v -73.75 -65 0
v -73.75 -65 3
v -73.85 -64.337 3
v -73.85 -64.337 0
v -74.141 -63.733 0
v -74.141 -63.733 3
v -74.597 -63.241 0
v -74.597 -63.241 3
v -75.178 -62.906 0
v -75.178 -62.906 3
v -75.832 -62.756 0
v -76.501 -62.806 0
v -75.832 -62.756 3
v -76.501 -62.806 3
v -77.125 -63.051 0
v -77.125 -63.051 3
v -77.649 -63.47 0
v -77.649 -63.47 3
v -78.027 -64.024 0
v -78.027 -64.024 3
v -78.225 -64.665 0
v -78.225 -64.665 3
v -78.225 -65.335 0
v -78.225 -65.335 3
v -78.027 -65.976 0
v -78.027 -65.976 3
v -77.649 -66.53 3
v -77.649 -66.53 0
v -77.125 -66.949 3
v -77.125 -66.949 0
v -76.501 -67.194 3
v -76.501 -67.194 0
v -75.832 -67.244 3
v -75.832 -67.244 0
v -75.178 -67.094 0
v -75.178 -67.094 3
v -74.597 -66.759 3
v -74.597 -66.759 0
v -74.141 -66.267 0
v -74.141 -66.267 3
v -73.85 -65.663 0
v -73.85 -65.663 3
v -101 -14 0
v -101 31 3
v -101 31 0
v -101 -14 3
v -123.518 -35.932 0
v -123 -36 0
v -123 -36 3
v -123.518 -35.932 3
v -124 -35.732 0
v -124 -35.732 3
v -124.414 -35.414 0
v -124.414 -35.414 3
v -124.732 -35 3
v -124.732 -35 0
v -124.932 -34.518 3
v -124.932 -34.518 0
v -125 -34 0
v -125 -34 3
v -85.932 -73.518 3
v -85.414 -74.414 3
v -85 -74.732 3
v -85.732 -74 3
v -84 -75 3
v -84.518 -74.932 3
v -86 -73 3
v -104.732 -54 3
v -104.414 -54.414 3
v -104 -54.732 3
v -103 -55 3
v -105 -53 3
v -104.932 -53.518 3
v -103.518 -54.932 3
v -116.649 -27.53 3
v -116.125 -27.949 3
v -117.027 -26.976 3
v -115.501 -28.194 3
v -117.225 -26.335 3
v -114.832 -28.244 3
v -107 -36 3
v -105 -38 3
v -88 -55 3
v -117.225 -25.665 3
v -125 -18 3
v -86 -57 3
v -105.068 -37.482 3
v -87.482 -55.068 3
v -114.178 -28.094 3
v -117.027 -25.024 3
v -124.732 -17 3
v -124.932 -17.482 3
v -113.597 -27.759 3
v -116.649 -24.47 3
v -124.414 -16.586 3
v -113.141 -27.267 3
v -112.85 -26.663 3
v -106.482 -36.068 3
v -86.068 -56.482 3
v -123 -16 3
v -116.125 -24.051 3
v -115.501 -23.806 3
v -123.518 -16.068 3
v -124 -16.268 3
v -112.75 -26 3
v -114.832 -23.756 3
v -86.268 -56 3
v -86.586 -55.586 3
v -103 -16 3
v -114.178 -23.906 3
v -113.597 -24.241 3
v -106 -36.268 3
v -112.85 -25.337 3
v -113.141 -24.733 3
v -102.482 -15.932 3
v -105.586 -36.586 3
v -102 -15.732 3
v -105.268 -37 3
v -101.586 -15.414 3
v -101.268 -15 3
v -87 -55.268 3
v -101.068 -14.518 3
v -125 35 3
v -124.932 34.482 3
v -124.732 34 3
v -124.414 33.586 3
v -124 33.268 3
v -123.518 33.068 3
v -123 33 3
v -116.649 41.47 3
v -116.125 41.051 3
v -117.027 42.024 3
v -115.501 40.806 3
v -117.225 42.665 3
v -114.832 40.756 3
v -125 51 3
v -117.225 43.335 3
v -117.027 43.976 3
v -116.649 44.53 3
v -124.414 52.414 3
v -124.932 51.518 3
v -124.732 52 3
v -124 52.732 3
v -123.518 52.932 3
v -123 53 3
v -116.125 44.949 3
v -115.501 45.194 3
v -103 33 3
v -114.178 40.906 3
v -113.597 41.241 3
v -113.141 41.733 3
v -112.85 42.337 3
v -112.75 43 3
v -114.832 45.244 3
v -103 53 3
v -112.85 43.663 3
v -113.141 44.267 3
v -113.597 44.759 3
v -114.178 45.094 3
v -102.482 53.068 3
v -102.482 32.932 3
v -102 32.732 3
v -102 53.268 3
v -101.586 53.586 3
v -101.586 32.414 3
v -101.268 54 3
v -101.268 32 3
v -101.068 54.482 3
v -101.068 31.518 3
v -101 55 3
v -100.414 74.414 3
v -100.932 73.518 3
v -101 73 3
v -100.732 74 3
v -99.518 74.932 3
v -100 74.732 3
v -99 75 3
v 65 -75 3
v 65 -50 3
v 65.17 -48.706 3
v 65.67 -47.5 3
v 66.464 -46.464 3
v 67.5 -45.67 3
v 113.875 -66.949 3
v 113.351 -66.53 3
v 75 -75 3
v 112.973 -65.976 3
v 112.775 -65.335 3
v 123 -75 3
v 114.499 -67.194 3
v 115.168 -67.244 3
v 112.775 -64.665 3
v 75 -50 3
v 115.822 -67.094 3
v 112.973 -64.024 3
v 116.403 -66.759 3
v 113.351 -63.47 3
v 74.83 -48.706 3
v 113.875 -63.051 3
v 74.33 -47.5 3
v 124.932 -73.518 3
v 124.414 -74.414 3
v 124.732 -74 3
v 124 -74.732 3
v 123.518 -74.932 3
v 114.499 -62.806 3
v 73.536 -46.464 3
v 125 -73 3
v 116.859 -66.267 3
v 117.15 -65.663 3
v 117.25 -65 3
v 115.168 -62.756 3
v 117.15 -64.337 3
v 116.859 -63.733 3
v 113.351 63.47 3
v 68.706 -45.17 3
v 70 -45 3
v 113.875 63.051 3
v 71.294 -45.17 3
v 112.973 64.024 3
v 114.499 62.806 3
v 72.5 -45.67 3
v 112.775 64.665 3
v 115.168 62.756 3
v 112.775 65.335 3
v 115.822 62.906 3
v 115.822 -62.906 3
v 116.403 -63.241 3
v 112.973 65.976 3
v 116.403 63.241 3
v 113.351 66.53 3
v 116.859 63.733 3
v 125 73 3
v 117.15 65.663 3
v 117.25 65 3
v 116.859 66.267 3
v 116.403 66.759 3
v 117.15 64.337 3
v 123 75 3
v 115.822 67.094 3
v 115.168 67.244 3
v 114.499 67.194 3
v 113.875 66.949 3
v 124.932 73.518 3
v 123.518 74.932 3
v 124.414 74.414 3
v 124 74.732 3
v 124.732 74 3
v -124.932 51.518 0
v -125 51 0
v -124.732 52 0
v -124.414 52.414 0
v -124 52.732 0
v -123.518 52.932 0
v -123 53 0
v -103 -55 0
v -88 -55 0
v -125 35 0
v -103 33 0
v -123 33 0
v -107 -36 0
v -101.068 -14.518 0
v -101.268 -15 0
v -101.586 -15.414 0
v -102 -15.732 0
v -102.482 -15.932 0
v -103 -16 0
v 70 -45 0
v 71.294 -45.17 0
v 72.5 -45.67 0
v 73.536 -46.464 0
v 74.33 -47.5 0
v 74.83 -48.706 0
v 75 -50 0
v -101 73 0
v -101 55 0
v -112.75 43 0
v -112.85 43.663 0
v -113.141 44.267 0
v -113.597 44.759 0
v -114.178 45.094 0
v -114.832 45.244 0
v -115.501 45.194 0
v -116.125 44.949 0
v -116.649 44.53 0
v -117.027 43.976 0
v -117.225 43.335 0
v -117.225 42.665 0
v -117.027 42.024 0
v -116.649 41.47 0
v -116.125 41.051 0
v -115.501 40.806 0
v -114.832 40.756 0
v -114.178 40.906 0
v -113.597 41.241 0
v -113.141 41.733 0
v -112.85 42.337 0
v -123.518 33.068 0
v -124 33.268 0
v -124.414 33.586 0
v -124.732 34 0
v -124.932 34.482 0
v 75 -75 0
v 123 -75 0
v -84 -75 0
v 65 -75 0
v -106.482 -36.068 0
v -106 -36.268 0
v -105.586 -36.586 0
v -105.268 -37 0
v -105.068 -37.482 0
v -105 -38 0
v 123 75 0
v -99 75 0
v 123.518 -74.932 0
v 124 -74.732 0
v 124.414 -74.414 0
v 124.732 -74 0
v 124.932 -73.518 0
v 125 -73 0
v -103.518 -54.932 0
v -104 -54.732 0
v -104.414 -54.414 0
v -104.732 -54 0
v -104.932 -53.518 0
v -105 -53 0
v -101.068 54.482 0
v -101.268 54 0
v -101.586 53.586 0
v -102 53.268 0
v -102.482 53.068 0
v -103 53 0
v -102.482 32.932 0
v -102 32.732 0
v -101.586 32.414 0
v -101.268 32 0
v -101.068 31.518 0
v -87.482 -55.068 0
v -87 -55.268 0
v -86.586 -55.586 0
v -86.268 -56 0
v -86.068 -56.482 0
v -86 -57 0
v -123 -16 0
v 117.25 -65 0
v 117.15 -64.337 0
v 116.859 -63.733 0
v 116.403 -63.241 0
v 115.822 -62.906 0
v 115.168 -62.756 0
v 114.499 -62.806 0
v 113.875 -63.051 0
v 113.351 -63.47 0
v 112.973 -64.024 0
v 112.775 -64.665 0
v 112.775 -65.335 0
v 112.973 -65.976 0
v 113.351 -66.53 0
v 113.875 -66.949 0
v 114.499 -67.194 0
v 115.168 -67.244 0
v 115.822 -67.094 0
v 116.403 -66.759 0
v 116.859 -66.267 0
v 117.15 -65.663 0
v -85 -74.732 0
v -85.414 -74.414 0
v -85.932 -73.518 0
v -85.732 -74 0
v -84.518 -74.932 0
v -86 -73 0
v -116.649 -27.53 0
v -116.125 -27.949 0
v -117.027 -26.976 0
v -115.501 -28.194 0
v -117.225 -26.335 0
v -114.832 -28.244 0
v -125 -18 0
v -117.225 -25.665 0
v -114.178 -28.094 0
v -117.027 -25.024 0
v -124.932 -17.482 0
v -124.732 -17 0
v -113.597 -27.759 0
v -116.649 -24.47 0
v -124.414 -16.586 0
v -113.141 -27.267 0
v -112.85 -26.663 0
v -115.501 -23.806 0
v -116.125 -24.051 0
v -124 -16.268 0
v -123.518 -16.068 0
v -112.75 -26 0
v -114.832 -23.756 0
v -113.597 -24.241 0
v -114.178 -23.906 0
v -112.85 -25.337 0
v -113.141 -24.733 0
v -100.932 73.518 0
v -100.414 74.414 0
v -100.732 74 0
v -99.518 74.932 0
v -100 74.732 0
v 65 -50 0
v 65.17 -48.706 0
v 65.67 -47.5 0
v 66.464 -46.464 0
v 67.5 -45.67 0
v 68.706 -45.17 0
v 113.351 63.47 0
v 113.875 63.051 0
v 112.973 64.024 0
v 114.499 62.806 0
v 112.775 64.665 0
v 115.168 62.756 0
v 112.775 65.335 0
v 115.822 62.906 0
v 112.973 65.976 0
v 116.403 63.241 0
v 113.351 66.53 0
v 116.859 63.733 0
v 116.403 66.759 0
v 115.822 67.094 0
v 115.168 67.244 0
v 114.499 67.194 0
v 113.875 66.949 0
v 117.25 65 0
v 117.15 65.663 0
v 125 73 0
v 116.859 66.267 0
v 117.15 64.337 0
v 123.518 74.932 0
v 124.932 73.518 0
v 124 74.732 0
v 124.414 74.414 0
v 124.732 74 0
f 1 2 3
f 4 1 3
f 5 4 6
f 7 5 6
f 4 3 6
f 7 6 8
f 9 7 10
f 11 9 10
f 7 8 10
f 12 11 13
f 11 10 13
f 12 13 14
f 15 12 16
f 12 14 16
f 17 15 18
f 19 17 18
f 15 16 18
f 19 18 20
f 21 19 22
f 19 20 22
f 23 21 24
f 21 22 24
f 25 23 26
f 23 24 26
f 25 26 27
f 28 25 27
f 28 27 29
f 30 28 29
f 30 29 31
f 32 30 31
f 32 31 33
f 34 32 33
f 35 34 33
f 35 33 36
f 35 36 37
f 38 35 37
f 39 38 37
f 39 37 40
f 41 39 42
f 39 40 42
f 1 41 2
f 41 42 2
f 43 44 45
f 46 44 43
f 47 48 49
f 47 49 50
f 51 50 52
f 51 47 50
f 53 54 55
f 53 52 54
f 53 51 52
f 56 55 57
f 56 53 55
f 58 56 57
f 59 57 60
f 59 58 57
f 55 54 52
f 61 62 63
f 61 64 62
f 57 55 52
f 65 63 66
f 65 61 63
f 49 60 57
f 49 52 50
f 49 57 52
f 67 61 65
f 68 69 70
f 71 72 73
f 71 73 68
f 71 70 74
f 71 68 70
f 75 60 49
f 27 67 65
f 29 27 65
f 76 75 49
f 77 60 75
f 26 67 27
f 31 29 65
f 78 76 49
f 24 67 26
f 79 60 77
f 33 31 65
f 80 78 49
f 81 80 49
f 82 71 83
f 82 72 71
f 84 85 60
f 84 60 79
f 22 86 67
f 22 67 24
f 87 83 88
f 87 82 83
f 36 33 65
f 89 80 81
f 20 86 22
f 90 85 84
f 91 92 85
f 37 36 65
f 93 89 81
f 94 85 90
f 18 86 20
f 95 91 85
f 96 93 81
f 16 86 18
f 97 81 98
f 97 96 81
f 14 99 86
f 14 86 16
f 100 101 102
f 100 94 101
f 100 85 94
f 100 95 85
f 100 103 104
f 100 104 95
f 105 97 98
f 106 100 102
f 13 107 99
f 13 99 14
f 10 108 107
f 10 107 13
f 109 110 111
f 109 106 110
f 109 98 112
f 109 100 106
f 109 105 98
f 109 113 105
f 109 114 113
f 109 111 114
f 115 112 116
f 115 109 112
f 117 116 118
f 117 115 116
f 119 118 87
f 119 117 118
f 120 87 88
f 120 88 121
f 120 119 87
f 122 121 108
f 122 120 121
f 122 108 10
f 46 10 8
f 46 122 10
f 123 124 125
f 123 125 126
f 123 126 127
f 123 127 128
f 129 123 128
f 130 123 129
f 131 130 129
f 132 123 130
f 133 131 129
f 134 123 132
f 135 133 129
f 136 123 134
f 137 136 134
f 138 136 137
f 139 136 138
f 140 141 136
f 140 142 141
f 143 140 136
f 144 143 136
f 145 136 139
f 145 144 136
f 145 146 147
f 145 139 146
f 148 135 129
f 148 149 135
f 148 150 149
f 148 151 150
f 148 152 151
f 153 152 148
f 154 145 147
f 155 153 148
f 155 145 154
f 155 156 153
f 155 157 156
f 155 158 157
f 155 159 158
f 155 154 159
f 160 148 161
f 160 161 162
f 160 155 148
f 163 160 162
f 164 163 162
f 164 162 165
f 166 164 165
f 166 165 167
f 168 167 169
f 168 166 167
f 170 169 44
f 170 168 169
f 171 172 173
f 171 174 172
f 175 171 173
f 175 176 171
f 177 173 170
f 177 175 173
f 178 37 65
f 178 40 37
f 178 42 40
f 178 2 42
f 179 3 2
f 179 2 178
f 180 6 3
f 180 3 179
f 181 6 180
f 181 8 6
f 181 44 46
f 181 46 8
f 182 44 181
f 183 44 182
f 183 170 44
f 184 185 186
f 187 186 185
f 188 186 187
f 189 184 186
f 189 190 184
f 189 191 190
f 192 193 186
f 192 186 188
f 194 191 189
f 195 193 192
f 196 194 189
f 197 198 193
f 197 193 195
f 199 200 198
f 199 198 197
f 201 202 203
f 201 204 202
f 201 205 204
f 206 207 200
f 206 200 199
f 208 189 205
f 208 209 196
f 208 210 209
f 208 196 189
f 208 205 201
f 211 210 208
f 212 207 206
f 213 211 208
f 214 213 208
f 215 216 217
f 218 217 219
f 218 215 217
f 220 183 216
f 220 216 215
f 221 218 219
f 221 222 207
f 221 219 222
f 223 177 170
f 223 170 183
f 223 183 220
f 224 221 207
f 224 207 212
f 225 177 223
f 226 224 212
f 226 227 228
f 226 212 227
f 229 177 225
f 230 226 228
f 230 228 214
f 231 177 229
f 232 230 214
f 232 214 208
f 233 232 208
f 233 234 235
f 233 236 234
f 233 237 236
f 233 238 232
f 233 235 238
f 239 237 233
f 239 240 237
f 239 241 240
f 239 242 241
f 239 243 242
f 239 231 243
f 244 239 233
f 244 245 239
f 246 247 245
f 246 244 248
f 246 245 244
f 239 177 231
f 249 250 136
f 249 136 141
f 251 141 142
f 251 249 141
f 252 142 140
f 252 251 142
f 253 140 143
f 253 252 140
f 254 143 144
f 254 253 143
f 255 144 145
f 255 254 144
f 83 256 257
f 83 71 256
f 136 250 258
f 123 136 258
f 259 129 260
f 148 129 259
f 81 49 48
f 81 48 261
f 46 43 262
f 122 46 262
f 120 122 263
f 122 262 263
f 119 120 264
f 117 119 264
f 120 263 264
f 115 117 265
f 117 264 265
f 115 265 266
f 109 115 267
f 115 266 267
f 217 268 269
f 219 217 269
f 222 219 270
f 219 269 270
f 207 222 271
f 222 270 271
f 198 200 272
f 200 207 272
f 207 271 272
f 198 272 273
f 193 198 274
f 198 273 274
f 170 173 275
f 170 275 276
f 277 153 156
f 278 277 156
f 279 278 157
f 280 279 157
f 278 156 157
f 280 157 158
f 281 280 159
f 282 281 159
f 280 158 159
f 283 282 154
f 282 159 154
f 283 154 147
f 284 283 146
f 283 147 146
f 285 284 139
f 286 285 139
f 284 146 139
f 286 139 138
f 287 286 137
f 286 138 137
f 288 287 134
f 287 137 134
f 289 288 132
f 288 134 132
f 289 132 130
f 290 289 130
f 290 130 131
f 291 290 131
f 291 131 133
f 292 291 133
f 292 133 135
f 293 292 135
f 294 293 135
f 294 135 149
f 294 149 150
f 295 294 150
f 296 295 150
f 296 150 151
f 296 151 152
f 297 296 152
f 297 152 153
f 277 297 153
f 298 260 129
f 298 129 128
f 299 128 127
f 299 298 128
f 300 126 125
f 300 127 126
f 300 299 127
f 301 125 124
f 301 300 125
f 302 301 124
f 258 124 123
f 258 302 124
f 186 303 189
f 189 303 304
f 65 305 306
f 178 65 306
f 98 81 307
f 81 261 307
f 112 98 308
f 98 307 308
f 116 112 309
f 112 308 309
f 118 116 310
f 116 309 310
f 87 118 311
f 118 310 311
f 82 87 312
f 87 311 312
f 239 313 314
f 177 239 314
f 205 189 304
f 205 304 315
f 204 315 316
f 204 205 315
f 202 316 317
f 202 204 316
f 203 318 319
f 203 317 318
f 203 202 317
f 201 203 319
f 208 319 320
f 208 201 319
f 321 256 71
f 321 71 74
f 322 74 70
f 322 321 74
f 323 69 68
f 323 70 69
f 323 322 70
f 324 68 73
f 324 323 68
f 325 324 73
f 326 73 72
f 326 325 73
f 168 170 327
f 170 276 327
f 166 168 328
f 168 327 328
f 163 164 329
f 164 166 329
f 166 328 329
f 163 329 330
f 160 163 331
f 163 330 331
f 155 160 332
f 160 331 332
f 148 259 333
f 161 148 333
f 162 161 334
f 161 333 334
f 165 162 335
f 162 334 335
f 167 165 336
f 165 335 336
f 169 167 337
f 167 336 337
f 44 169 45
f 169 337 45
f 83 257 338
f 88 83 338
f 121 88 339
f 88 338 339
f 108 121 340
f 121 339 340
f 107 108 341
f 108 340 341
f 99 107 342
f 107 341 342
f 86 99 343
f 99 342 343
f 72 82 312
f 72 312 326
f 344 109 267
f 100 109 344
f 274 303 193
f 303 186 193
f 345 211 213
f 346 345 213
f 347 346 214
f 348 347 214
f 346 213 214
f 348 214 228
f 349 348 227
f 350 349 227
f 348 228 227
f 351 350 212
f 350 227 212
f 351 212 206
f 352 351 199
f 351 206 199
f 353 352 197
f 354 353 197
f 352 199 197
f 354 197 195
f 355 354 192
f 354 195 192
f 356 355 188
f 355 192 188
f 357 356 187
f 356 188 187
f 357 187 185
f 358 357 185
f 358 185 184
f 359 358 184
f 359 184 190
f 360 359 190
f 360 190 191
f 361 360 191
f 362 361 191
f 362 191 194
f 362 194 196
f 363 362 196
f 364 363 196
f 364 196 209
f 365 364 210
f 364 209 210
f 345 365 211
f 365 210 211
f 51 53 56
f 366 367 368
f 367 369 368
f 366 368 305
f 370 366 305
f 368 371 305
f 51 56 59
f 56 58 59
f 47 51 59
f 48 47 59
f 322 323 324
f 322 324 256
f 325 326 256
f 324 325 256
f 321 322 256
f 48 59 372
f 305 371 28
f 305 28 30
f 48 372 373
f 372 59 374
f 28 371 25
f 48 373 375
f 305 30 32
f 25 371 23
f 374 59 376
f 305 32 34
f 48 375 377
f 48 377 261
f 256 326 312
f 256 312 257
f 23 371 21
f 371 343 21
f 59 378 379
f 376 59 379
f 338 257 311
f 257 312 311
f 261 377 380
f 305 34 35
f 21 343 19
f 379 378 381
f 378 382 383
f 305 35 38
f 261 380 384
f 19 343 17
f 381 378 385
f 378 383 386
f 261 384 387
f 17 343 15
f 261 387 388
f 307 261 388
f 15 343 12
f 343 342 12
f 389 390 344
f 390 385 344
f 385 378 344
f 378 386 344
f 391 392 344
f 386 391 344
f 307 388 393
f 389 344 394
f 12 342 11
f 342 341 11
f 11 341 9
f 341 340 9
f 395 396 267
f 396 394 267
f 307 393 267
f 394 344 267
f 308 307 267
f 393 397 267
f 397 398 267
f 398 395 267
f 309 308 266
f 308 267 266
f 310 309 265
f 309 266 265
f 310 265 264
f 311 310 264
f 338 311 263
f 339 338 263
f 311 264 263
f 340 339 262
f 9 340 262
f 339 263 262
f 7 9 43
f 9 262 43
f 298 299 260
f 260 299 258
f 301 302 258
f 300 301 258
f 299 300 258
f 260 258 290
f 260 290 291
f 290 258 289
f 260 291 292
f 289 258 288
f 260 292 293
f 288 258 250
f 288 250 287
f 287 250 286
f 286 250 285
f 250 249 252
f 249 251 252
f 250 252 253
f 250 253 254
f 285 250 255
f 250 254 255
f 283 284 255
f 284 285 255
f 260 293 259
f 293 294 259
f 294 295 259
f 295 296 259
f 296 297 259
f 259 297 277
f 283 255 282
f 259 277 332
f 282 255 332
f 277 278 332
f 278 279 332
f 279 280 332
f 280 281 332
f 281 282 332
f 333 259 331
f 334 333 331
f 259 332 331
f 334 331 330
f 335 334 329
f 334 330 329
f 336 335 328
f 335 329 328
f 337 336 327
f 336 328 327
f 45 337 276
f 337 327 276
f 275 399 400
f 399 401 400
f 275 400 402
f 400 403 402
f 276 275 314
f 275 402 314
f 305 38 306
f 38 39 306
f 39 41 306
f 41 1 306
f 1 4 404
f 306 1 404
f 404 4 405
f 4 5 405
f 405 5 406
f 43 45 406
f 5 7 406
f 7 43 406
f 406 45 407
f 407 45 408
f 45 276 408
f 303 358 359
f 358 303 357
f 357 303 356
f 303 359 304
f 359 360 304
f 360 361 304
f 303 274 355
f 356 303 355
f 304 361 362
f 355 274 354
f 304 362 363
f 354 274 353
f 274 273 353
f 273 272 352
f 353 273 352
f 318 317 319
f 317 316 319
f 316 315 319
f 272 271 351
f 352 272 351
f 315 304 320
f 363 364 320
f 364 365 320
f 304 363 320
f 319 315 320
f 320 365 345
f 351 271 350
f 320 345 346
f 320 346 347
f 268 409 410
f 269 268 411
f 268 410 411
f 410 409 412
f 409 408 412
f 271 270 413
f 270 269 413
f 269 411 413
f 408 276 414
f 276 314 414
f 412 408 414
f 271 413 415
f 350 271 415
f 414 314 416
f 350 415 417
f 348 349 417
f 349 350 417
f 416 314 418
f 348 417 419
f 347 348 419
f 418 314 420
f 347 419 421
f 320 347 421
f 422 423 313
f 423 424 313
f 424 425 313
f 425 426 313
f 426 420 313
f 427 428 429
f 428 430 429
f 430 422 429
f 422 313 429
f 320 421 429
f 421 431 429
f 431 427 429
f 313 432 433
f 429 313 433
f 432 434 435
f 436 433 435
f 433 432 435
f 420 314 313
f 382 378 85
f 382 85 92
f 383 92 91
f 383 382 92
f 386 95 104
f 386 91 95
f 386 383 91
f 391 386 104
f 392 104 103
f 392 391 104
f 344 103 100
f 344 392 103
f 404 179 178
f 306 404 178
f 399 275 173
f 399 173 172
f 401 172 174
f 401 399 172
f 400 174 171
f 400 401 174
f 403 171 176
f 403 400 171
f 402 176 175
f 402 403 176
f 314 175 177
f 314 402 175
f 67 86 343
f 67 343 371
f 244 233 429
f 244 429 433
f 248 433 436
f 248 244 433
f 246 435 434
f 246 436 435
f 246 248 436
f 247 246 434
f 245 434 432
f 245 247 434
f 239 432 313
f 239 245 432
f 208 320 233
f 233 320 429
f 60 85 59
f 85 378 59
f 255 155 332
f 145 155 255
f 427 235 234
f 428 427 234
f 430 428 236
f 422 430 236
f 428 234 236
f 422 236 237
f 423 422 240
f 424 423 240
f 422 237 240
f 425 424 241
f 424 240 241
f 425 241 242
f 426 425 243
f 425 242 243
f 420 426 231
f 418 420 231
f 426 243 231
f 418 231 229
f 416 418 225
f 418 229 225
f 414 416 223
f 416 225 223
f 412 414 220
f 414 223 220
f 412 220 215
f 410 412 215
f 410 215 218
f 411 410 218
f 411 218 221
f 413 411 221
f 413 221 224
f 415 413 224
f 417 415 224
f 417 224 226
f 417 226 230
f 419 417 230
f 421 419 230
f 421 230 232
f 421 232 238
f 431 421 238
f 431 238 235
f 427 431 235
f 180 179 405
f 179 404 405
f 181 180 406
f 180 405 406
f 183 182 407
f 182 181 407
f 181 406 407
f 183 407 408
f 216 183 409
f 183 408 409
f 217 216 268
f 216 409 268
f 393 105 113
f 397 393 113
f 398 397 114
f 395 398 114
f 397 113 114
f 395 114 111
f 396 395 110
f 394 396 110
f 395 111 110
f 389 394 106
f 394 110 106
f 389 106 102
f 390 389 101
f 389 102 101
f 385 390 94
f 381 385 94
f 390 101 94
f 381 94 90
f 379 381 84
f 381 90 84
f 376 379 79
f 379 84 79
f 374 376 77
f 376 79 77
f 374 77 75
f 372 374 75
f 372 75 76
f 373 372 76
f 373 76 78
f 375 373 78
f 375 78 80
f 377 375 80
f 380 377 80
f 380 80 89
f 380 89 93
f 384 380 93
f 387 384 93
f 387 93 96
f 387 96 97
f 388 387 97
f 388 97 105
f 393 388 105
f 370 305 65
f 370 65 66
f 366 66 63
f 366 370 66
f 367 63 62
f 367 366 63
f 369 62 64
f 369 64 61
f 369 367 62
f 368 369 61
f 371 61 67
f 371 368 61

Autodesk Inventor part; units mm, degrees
ref_plane "YZ Plane" through (0, 0, 0) normal (1, 0, 0) x (0, 1, 0)
ref_plane "XZ Plane" through (0, 0, 0) normal (0, 1, 0) x (-1, 0, 0)
ref_plane "XY Plane" through (0, 0, 0) normal (0, 0, 1) x (1, 0, 0)
sketch "Sketch1" plane through (0, 0, 0) normal (0, 0, 1) x (1, 0, 0)
  line L0 (-125, -75) -> (125, -75)
  line L1 (125, -75) -> (125, 75)
  line L2 (125, 75) -> (-125, 75)
  line L3 (-125, 75) -> (-125, -75)
  line L4 (-125, -75) -> (125, 75) construction
  line L5 (125, -75) -> (-125, 75) construction
  point P0 (0, 0)
  dimension "d0" = 150
  dimension "d1" = 250
extrude "Extrusion1" add sketch "Sketch1" along normal blind 3
sketch "Sketch2" plane through (0, 0, 3) normal (0, 0, 1) x (1, 0, 0)
  line L0 (125, -75) -> (125, 75) construction
  line L1 (125, 75) -> (-125, 75) construction
  line L2 (-125, 75) -> (-125, -75) construction
  line L3 (-125, -75) -> (125, -75) construction
  line L4 (-125, -36) -> (-105, -36)
  line L5 (-105, -36) -> (-105, -55)
  line L6 (-105, -55) -> (-86, -55)
  line L7 (-86, -55) -> (-86, -75)
  line L8 (-125, -75) -> (125, -75) construction
  line L9 (-125, 75) -> (-125, -75) construction
  line L10 (-125, -36) -> (-125, -75)
  line L11 (-86, -75) -> (-125, -75)
  line L12 (-125, 33) -> (-101, 33)
  line L13 (-101, 33) -> (-101, -16)
  line L14 (-101, -16) -> (-125, -16)
  line L15 (-125, -16) -> (-125, 33)
  line L16 (65, -75) -> (75, -75)
  line L17 (75, -75) -> (75, -45)
  line L18 (75, -45) -> (65, -45)
  line L19 (65, -45) -> (65, -75)
  line L20 (125, 75) -> (-125, 75) projected
  line L21 (-125, 75) -> (-101, 75)
  line L22 (-101, 75) -> (-101, 53)
  line L23 (-101, 53) -> (-125, 53)
  line L24 (-125, 53) -> (-125, 75)
  point P0 (0, 0)
  dimension "d4" = 39
  dimension "d5" = 39
  dimension "d6" = 20
  dimension "d7" = 20
  dimension "d9" = 24
  dimension "d11" = 20
  dimension "d13" = 10
  dimension "d14" = 30
  dimension "d36" = 50
  dimension "d37" = 22
  dimension "d39" = 42
extrude "Extrusion2" cut sketch "Sketch2" against normal blind 3
sketch "Sketch3" plane through (0, 0, 3) normal (0, 0, 1) x (1, 0, 0)
  circle A0 centre (-115, 43) radius 2.25
  circle A1 centre (-115, -26) radius 2.25
  circle A2 centre (115, 65) radius 2.25
  circle A3 centre (115, -65) radius 2.25
  circle A4 centre (-76, -65) radius 2.25
  line L0 (125, 75) -> (-125, 75) projected
  line L1 (-125, 75) -> (-125, 33) projected
  line L2 (-125, -16) -> (-125, -36) projected
  line L3 (-125, -36) -> (-105, -36) projected
  line L4 (-86, -75) -> (65, -75) projected
  line L5 (-86, -55) -> (-86, -75) projected
  line L6 (75, -75) -> (125, -75) projected
  line L7 (125, -75) -> (125, 75) projected
  line L8 (-125, 53) -> (-101, 53) projected
  point P0 (0, 0)
  dimension "d17" = 4.5
  dimension "d18" = 4.5
  dimension "d19" = 4.5
  dimension "d20" = 4.5
  dimension "d21" = 4.5
  dimension "d23" = 10
  dimension "d24" = 10
  dimension "d25" = 10
  dimension "d26" = 10
  dimension "d27" = 10
  dimension "d28" = 10
  dimension "d29" = 10
  dimension "d30" = 10
  dimension "d31" = 10
  dimension "d38" = 10
extrude "Extrusion3" cut sketch "Sketch3" against normal through all
fillet "Fillet1" radius 2 14 edges at (125, 75, 1.5) (125, -75, 1.5) (-86, -75, 1.5) (-86, -55, 1.5) (-105, -55, 1.5) (-105, -36, 1.5) (-125, -36, 1.5) (-125, -16, 1.5) (-101, -16, 1.5) (-101, 33, 1.5) (-125, 33, 1.5) (-125, 53, 1.5) (-101, 53, 1.5) (-101, 75, 1.5)
fillet "Fillet1" radius 5 2 edges at (65, -45, 1.5) (75, -45, 1.5)
sketch "Sketch4" plane through (0, 0, 3) normal (0, 0, 1) x (1, 0, 0)
  arc A0 (-99, 75) -> (-101, 73) centre (-99, 73) ccw projected
  line L0 (-101, 73) -> (-101, 55) projected
  arc A1 (-103, 53) -> (-101, 55) centre (-103, 55) ccw projected
  line L1 (-103, 53) -> (-123, 53) projected
  arc A2 (-123, 53) -> (-125, 51) centre (-123, 51) ccw projected
  line L2 (-125, 51) -> (-125, 35) projected
  arc A3 (-125, 35) -> (-123, 33) centre (-123, 35) ccw projected
  line L3 (-123, 33) -> (-103, 33) projected
  arc A4 (-101, 31) -> (-103, 33) centre (-103, 31) ccw projected
  line L4 (-101, 31) -> (-101, -14) projected
  arc A5 (-103, -16) -> (-101, -14) centre (-103, -14) ccw projected
  line L5 (-103, -16) -> (-123, -16) projected
  arc A6 (-123, -16) -> (-125, -18) centre (-123, -18) ccw projected
  line L6 (-125, -18) -> (-125, -34) projected
  arc A7 (-125, -34) -> (-123, -36) centre (-123, -34) ccw projected
  line L7 (-123, -36) -> (-107, -36) projected
  arc A8 (-105, -38) -> (-107, -36) centre (-107, -38) ccw projected
  line L8 (-105, -38) -> (-105, -53) projected
  arc A9 (-105, -53) -> (-103, -55) centre (-103, -53) ccw projected
  line L9 (-103, -55) -> (-88, -55) projected
  arc A10 (-86, -57) -> (-88, -55) centre (-88, -57) ccw projected
  line L10 (-86, -57) -> (-86, -73) projected
  arc A11 (-86, -73) -> (-84, -75) centre (-84, -73) ccw projected
  line L11 (-84, -75) -> (65, -75) projected
  line L12 (65, -75) -> (65, -50) projected
  arc A12 (75, -50) -> (65, -50) centre (70, -50) ccw projected
  line L13 (75, -50) -> (75, -75) projected
  line L14 (75, -75) -> (123, -75) projected
  arc A13 (123, -75) -> (125, -73) centre (123, -73) ccw projected
  line L15 (125, -73) -> (125, 73) projected
  arc A14 (125, 73) -> (123, 75) centre (123, 73) ccw projected
  line L16 (123, 75) -> (-99, 75) projected
  circle A15 centre (-115, 43) radius 2.25 projected
  circle A16 centre (115, 65) radius 2.25 projected
  circle A17 centre (-115, -26) radius 2.25 projected
  circle A18 centre (115, -65) radius 2.25 projected
  circle A19 centre (-76, -65) radius 2.25 projected
  point P0 (0, 0)
equation "\"d5\" = d4"
equation "\"d18\" = d17"
equation "\"d19\" = d17"
equation "\"d20\" = d17"
equation "\"d21\" = d17"
equation "\"d24\" = d23"
equation "\"d25\" = d23"
equation "\"d26\" = d25"
equation "\"d27\" = d25"
equation "\"d28\" = d26"
equation "\"d29\" = d26"
equation "\"d30\" = d23"
equation "\"d31\" = d23"
equation "\"d38\" = d23"
properties part number "SideAcrylicSheet"
